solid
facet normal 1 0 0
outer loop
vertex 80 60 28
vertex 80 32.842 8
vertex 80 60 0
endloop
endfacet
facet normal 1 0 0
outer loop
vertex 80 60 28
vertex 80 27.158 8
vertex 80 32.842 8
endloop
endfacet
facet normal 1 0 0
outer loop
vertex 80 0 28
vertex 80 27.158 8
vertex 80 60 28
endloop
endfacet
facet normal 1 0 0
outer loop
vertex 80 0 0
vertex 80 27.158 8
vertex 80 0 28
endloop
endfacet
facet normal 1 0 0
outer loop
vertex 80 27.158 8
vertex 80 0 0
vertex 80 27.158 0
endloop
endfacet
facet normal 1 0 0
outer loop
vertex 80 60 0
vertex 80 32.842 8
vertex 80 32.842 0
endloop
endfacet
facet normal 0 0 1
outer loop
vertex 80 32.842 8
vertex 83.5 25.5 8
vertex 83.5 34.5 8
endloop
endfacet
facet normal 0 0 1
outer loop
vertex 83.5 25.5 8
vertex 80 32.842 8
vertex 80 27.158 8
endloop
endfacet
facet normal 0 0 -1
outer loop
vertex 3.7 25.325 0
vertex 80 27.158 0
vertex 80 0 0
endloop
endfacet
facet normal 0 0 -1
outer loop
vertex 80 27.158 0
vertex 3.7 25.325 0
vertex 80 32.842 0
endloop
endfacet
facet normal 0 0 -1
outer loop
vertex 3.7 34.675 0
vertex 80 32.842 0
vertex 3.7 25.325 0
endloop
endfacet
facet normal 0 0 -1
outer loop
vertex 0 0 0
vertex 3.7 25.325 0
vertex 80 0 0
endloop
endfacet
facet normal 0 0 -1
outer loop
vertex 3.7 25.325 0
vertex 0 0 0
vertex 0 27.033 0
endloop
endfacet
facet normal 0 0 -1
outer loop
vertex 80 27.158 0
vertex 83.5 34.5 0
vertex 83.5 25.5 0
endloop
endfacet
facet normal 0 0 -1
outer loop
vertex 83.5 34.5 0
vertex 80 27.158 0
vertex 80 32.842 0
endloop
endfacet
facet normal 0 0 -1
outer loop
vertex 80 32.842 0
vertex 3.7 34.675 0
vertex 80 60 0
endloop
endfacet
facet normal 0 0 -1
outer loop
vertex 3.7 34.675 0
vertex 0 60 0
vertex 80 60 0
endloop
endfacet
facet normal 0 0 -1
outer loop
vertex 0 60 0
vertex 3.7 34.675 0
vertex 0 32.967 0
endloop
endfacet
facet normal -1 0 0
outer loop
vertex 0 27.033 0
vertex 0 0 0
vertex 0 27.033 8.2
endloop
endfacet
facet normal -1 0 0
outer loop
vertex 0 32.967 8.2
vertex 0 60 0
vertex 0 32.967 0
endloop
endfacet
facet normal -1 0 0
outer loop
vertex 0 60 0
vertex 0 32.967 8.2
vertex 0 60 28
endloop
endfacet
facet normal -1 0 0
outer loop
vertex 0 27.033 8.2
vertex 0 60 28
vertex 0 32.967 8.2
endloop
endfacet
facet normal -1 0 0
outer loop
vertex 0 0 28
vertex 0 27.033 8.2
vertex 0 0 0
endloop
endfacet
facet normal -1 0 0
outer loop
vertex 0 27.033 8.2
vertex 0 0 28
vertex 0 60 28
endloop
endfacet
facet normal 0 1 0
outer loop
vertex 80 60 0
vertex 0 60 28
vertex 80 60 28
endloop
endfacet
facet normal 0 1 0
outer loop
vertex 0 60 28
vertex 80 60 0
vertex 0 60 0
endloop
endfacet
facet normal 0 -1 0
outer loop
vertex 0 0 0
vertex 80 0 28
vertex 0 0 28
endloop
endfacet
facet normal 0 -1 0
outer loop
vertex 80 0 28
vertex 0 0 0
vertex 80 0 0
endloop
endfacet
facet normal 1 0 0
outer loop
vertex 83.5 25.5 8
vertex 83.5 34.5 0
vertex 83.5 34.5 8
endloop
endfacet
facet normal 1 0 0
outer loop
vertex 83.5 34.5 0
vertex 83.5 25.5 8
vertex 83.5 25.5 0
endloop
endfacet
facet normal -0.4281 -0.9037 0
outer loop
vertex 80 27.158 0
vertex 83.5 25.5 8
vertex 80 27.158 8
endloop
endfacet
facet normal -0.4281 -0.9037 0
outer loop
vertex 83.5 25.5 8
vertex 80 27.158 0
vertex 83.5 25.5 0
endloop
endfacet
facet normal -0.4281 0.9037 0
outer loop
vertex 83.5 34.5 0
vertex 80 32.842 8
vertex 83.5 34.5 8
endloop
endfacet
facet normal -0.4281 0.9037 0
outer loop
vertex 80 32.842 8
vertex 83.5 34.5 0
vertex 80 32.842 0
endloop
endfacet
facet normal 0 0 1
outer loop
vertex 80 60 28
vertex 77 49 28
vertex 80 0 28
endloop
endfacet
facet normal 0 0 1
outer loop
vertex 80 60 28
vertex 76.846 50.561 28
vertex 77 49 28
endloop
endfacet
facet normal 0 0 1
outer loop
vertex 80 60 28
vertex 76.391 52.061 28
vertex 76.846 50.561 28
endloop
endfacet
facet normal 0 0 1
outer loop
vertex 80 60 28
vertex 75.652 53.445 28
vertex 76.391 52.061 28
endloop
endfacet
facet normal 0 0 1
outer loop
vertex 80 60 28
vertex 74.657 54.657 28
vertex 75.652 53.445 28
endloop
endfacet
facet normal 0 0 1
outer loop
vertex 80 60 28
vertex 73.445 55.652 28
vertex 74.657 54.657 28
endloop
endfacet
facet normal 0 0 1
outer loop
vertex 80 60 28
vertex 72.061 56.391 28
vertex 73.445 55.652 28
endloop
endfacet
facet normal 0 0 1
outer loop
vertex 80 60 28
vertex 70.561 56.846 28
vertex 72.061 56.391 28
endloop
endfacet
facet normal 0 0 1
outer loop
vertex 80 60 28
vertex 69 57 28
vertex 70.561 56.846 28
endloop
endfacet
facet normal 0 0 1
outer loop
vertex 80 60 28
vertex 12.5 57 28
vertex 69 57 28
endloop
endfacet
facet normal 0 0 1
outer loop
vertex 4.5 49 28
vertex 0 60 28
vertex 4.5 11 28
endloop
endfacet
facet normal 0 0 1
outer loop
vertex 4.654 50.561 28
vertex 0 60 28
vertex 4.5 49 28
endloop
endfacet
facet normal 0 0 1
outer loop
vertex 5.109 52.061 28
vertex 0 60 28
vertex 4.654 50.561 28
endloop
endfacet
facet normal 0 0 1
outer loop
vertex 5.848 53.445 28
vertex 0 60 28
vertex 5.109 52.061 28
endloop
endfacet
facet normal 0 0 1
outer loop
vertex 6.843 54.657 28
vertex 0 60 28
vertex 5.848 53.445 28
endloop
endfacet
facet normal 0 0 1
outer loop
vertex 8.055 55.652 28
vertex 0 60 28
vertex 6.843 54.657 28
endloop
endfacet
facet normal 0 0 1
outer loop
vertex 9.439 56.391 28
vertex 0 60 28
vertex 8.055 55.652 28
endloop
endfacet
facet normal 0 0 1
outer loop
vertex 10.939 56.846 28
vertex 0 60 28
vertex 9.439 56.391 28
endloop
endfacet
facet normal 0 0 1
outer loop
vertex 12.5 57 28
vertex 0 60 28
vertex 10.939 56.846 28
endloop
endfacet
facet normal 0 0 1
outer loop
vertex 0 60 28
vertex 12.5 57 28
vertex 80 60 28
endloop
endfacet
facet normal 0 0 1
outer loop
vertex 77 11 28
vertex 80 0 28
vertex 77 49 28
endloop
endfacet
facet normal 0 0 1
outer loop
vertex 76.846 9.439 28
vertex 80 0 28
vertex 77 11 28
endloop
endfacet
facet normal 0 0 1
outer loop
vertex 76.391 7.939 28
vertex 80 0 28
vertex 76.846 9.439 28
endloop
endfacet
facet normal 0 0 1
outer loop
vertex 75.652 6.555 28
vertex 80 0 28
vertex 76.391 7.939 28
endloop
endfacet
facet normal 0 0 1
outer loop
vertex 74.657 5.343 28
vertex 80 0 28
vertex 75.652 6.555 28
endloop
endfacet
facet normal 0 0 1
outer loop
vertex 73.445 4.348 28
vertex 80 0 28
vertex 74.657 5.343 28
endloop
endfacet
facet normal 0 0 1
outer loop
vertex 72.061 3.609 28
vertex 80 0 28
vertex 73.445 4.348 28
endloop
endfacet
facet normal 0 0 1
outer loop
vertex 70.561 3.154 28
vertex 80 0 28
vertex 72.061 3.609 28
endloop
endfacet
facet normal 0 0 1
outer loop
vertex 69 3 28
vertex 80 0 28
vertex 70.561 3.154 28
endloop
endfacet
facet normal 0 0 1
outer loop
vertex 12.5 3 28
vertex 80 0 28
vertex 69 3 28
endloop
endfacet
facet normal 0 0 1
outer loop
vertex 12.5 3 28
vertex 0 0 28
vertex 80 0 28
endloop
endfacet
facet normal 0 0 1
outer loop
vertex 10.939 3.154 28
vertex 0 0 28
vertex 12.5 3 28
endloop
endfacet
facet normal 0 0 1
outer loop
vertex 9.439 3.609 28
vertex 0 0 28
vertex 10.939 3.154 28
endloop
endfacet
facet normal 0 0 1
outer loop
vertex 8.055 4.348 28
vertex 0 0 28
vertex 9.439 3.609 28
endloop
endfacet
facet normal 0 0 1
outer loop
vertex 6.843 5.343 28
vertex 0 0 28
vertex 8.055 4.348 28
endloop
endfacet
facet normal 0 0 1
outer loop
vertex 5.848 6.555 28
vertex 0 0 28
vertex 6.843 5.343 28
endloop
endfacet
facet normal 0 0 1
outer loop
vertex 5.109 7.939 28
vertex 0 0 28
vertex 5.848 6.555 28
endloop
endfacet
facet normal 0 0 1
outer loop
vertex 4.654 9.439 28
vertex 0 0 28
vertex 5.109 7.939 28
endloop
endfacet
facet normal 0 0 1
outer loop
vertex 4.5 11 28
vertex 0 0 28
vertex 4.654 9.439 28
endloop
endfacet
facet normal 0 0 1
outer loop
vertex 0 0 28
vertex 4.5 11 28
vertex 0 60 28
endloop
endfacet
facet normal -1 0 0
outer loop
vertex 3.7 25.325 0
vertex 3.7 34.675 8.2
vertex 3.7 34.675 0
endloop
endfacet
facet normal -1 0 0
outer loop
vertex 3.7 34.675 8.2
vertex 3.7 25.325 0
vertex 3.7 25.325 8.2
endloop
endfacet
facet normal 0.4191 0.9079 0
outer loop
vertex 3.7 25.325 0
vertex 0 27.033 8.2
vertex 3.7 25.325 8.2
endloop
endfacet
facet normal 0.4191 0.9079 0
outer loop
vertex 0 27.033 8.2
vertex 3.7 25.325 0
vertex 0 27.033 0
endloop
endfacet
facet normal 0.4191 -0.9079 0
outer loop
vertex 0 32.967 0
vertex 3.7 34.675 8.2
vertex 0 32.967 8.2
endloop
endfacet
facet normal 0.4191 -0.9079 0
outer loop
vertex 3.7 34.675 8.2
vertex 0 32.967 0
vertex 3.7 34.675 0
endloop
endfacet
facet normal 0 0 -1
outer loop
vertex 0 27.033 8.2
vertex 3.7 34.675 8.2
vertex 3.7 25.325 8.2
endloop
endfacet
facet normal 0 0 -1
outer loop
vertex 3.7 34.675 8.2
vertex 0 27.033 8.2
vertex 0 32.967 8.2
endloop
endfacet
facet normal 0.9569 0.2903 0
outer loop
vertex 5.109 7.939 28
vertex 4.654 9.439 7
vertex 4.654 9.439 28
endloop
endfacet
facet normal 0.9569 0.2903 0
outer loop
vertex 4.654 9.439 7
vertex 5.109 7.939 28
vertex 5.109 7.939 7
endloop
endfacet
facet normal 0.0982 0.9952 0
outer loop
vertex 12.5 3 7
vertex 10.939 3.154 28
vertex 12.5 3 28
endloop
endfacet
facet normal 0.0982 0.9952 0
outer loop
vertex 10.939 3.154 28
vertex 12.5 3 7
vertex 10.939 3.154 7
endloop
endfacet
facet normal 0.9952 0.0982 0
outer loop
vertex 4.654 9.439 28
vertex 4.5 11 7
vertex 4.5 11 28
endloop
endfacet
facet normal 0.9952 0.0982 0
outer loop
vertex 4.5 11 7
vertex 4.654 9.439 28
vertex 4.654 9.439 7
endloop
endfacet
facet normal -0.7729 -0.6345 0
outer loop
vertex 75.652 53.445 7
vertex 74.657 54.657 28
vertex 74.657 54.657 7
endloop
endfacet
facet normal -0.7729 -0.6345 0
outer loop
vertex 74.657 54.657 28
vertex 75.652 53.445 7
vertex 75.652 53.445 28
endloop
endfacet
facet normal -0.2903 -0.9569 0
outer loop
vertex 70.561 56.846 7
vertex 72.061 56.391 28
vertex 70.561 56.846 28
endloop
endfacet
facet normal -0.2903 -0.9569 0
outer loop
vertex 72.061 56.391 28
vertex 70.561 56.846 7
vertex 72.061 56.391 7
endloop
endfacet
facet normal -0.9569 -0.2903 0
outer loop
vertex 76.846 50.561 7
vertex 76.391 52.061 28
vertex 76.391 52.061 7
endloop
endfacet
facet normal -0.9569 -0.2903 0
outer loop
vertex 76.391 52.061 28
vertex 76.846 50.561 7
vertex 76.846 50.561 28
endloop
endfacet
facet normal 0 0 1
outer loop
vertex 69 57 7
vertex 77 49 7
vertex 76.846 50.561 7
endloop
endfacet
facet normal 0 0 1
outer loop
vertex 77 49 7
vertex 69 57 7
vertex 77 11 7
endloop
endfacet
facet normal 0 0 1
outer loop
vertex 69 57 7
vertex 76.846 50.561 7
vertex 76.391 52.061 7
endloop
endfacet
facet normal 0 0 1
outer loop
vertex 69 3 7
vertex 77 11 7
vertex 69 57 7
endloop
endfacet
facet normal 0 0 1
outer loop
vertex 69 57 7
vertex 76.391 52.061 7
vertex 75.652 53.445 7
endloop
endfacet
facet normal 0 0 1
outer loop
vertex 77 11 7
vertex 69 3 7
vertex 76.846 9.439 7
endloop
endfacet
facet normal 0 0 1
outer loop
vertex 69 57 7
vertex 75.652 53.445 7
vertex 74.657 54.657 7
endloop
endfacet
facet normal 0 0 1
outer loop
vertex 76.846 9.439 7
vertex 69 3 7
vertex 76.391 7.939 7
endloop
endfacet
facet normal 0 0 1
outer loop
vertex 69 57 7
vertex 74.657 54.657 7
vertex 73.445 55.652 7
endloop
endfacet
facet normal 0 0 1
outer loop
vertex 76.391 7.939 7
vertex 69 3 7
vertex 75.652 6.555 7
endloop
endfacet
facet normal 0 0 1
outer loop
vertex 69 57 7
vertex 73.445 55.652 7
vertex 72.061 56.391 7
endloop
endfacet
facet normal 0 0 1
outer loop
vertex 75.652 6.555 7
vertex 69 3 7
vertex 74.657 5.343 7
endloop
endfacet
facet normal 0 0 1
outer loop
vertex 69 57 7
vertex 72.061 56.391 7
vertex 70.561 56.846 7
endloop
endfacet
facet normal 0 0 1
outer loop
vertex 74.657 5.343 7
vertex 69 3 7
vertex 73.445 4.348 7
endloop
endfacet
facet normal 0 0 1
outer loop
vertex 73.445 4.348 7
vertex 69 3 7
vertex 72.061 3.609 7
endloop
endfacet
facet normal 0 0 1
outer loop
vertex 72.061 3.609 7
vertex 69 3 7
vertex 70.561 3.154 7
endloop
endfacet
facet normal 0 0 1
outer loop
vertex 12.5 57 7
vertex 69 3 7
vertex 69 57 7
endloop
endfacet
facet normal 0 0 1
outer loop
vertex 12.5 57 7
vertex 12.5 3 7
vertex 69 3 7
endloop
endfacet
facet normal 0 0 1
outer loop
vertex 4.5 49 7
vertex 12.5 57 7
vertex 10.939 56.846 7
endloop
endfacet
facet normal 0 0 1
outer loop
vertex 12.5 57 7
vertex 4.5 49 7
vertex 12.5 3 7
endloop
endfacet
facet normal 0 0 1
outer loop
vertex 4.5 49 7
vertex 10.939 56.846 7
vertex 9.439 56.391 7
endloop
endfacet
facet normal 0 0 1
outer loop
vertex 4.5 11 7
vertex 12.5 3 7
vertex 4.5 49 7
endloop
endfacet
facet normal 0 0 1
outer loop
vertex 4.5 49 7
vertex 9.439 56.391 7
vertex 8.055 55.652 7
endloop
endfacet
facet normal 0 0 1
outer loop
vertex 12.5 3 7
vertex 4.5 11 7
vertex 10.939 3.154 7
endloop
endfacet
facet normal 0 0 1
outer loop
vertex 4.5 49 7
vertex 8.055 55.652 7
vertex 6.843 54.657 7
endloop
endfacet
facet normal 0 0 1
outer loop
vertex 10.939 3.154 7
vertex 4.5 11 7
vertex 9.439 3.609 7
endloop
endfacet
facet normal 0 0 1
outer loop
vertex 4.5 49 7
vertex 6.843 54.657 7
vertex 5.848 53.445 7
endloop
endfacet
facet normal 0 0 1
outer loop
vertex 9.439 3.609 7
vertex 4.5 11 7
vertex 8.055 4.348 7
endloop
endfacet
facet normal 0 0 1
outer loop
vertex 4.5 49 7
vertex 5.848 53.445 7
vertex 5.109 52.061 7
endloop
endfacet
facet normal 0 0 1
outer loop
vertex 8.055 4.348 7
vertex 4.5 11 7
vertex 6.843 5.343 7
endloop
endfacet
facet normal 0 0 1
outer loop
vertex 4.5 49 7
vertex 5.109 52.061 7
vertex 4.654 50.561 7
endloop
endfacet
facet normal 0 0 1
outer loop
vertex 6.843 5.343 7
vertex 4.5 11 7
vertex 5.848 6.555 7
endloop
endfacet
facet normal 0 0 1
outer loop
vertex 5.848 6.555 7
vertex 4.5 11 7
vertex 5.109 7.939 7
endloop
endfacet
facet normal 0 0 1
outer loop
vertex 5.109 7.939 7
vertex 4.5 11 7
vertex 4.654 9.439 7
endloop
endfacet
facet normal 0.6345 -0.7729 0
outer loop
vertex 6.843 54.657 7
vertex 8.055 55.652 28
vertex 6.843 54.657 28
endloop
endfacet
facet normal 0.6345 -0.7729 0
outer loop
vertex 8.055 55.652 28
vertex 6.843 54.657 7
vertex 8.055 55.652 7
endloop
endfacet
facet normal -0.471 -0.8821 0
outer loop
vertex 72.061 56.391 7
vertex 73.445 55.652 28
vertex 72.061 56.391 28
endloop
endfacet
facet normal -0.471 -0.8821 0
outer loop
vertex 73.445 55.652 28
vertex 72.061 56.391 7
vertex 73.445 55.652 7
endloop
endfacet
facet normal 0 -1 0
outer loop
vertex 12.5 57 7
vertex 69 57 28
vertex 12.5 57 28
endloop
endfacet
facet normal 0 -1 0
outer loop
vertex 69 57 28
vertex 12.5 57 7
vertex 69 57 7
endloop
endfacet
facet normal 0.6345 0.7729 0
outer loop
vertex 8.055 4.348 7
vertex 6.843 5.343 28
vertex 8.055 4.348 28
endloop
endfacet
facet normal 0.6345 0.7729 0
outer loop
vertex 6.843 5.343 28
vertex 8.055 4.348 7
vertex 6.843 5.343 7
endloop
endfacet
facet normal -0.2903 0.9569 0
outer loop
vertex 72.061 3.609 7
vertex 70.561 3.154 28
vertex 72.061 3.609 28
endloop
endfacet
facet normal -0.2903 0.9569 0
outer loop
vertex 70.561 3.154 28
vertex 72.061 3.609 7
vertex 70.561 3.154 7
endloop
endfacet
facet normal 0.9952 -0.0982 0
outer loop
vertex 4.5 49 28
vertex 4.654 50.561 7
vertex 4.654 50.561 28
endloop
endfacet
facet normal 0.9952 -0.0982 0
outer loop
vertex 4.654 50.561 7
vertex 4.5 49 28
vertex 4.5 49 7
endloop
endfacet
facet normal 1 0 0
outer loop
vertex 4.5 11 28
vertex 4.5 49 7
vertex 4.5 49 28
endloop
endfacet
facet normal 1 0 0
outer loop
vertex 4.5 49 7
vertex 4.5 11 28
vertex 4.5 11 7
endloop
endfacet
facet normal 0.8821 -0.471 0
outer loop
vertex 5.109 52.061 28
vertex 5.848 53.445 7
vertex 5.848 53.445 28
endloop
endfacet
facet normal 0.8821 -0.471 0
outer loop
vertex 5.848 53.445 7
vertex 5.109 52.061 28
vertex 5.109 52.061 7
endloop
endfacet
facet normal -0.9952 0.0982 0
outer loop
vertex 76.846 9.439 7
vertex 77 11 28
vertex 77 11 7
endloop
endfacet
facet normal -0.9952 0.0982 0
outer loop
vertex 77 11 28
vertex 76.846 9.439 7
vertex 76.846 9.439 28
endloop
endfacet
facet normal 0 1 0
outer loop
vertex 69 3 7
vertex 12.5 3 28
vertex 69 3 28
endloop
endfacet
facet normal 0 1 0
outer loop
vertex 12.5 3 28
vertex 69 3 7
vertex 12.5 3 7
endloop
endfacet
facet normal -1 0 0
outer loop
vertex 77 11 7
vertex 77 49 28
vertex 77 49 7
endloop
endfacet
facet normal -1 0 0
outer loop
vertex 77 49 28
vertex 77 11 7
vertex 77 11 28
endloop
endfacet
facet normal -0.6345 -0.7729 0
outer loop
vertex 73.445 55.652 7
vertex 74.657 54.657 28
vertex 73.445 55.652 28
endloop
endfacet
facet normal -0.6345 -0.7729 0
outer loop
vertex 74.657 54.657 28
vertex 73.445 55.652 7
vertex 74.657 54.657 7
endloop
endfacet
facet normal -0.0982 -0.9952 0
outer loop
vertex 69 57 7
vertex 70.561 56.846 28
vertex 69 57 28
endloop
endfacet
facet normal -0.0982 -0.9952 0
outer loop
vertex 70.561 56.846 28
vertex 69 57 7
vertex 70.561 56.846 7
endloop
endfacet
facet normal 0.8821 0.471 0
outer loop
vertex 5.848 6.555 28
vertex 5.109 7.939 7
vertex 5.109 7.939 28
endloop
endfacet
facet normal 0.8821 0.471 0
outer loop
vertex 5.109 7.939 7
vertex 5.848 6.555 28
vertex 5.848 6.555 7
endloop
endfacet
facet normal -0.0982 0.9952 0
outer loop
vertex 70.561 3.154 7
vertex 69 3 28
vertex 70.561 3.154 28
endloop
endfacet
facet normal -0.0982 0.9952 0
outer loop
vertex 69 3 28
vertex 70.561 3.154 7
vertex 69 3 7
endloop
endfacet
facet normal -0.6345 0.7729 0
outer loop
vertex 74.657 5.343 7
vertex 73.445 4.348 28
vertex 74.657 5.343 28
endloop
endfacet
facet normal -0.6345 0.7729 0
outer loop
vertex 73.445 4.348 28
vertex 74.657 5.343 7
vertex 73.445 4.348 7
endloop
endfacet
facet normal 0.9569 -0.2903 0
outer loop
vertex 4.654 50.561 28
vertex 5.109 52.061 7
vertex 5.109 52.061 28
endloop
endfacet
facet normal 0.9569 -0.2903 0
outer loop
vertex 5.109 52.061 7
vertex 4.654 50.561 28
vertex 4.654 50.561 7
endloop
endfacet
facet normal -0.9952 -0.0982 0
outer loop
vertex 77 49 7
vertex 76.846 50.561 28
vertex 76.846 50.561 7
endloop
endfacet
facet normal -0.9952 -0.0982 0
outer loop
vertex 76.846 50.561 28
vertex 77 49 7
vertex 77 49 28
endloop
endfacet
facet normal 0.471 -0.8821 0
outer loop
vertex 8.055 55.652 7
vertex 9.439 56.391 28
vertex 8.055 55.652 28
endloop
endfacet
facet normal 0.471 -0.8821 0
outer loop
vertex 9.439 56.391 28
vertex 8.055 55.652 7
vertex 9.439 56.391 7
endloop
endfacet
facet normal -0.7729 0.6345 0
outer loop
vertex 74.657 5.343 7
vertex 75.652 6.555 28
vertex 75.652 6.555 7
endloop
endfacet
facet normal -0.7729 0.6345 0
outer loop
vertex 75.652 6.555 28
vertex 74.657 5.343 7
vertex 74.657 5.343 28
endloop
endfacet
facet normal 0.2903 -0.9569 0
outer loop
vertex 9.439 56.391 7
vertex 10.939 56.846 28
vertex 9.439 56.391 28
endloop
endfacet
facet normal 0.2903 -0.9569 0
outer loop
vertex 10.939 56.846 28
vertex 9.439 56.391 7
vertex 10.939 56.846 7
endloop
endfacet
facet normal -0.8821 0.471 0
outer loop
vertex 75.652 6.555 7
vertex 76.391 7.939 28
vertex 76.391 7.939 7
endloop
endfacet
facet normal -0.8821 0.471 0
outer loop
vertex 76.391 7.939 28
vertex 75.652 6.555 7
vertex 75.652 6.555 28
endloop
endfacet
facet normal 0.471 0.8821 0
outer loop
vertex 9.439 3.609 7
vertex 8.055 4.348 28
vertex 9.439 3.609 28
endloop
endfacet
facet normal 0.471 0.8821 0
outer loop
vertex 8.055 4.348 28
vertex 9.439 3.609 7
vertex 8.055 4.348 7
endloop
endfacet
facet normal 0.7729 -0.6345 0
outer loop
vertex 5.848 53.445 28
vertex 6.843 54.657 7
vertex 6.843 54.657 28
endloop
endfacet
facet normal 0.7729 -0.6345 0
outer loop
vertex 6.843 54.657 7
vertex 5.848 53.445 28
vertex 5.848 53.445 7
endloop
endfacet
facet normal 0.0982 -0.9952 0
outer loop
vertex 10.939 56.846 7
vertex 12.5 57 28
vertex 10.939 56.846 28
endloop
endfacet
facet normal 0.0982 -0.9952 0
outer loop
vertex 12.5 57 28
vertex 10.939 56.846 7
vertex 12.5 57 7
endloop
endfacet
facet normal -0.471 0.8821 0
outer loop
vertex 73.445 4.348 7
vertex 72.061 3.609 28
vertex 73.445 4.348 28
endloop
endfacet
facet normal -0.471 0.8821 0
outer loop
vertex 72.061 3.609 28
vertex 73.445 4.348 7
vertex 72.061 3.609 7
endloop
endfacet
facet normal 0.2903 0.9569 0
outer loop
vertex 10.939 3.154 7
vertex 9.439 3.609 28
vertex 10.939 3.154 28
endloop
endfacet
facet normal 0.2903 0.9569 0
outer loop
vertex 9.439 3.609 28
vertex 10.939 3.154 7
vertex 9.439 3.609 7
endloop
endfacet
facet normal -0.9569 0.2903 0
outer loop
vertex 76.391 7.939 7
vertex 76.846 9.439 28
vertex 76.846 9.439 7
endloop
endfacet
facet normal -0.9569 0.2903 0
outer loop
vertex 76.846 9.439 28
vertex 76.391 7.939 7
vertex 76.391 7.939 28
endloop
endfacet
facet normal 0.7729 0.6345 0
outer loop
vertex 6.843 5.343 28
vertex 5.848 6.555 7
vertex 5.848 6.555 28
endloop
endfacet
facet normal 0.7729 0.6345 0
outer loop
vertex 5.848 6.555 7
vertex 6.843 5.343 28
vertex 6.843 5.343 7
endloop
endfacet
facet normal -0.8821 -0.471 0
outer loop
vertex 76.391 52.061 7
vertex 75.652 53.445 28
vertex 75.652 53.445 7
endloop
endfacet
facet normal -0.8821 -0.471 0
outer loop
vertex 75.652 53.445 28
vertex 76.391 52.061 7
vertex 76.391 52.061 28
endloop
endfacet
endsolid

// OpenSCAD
// file: ../lib/connector.scad
// lib/connector.scad — shared dovetail edge profile + base plinth.
// Extruded along Z with a constant XY cross-section, so two modules
// assemble by setting one down from above (tab drops into slot with
// zero collision at any height); once seated, the flare traps the tab
// against sideways separation. See docs/PROJECT-SPEC.md for the
// connector spec this implements.

module dovetail_tab(width=9, depth=3.5, height=8) {
    // Root extends 0.3mm behind x=0 so the tab always has real
    // volumetric overlap with whatever it's unioned onto, rather than
    // touching at a single coincident face (which CGAL can render as
    // two disjoint volumes instead of one fused solid).
    neck_w = width * 0.6;
    linear_extrude(height=height)
        polygon(points=[
            [-0.3, -neck_w/2],
            [-0.3, neck_w/2],
            [depth, width/2],
            [depth, -width/2]
        ]);
}

module dovetail_slot(width=9, depth=3.5, height=8, clearance=0.175) {
    neck_w = width * 0.6 + 2*clearance;
    tip_w  = width + 2*clearance;
    translate([0, 0, -0.2])
        linear_extrude(height=height + 0.4)
            polygon(points=[
                [-0.2, -neck_w/2],
                [-0.2, neck_w/2],
                [depth + 0.2, tip_w/2],
                [depth + 0.2, -tip_w/2]
            ]);
}

// Places a tab centered on a Y-running edge of the given length,
// protruding in +X from x=0. Call with translate() to position at the
// actual edge of your module's footprint.
module edge_tab(edge_length, width=9, depth=3.5, height=8) {
    translate([0, edge_length/2, 0])
        dovetail_tab(width=width, depth=depth, height=height);
}

module edge_slot(edge_length, width=9, depth=3.5, height=8, clearance=0.175) {
    translate([0, edge_length/2, 0])
        dovetail_slot(width=width, depth=depth, height=height, clearance=clearance);
}

module base_plinth(footprint_x, footprint_y, height=8) {
    cube([footprint_x, footprint_y, height]);
}
// file: ../config.scad
// config.scad — single source of truth for every physical dimension
// used across modules/. Status tags match docs/PROJECT-SPEC.md's
// Parameters table: MEASURED (trust it), SOURCE (verify with calipers
// before printing), MEASURE (blocked, no real value exists yet).

// Connector geometry — DECIDED, shared across all modules
tab_width           = 9;     // mm, spec range 8-10mm
tab_depth           = 3.5;   // mm, spec range 3-4mm
tab_clearance       = 0.175; // mm per side, spec range 0.15-0.2mm
base_plinth_height  = 8;     // mm, shared plinth height across all modules

// Physical measurements
bottle_diameter = 28;    // mm — SOURCE: Vallejo 20ml listing, proxy for Smallbudi 20ml bottles
handle_width    = 10;    // mm — MEASURED: user's brush set
brush_length    = 220;   // mm — MEASURED: user's brush set
marker_diameter = undef; // MEASURE: no marker product selected yet — blocks modules/marker_holders.scad
// main file
// modules/water_reservoir.scad — single open well, rounded interior
// corners, 3mm minimum wall thickness. Footprint 80x60mm (spec estimate:
// 60-100mm on the long side).
//
// Same plinth-height bug bottle_row.scad hit (see its header comment):
// base_plinth_height is only the connector-alignment floor (8mm), not
// the module's full body. The plan's original Task 5 draft cut a 20mm
// well straight into that 8mm plinth, which is geometrically impossible
// and would have rendered a hole tunneling out the bottom/side of the
// part instead of a vessel. Fix: a separate rim wall unioned on top of
// the plinth, well cut into the rim (plus a shallow 1mm bite into the
// plinth top for a clean CSG fusion, same convention bottle_row uses)
// — the remaining ~7mm of plinth below the well becomes the reservoir's
// actual floor, which is also what makes it capable of holding water at
// all.
include <../config.scad>
use <../lib/connector.scad>

footprint_x  = 80;
footprint_y  = 60;
wall         = 3;
well_depth   = 20;
corner_r     = 8;
total_height = base_plinth_height + well_depth;

// Root cause of the printed-part hole: edge_slot() (lib/connector.scad)
// cuts depth+0.2 = 3.7mm deep into the x=0 face, and also pokes 0.4mm
// above base_plinth_height into the rim. rounded_well()'s own 1mm bite
// below base_plinth_height (see its header) overlaps that same z-band.
// With wall=3mm < 3.7mm, the well's inner face (x=wall) sat inside the
// slot's cut zone, so the two voids joined into one tunnel straight
// through the connector-side wall into the reservoir. Only the slot
// edge (x=0) needs extra clearance — widening `wall` on all four sides
// would cost ~12% of the reservoir's volume for no reason.
slot_wall    = tab_depth + 0.2 + 0.8;  // slot cut depth + its fixed
                                        // 0.2mm overcut + 0.8mm real
                                        // print-safety margin
well_x0      = max(wall, slot_wall);

module rounded_well(x, y, w, h, r, depth) {
    // Starts 1mm into the plinth top (clean CSG fusion, same overcut
    // convention as bottle_row.scad) and punches 2mm past the rim's
    // actual top so the well is genuinely open, not a sealed pocket.
    translate([x, y, base_plinth_height - 1])
        linear_extrude(height=depth + 3)
            hull() {
                translate([r, r]) circle(r=r, $fn=32);
                translate([w - r, r]) circle(r=r, $fn=32);
                translate([r, h - r]) circle(r=r, $fn=32);
                translate([w - r, h - r]) circle(r=r, $fn=32);
            }
}

difference() {
    union() {
        base_plinth(footprint_x, footprint_y, base_plinth_height);
        translate([footprint_x, 0, 0])
            edge_tab(footprint_y, width=tab_width, depth=tab_depth, height=base_plinth_height);
        translate([0, 0, base_plinth_height])
            cube([footprint_x, footprint_y, well_depth]);
    }
    edge_slot(footprint_y, width=tab_width, depth=tab_depth, height=base_plinth_height, clearance=tab_clearance);
    rounded_well(well_x0, wall, footprint_x - well_x0 - wall, footprint_y - 2*wall, corner_r, well_depth);
}
